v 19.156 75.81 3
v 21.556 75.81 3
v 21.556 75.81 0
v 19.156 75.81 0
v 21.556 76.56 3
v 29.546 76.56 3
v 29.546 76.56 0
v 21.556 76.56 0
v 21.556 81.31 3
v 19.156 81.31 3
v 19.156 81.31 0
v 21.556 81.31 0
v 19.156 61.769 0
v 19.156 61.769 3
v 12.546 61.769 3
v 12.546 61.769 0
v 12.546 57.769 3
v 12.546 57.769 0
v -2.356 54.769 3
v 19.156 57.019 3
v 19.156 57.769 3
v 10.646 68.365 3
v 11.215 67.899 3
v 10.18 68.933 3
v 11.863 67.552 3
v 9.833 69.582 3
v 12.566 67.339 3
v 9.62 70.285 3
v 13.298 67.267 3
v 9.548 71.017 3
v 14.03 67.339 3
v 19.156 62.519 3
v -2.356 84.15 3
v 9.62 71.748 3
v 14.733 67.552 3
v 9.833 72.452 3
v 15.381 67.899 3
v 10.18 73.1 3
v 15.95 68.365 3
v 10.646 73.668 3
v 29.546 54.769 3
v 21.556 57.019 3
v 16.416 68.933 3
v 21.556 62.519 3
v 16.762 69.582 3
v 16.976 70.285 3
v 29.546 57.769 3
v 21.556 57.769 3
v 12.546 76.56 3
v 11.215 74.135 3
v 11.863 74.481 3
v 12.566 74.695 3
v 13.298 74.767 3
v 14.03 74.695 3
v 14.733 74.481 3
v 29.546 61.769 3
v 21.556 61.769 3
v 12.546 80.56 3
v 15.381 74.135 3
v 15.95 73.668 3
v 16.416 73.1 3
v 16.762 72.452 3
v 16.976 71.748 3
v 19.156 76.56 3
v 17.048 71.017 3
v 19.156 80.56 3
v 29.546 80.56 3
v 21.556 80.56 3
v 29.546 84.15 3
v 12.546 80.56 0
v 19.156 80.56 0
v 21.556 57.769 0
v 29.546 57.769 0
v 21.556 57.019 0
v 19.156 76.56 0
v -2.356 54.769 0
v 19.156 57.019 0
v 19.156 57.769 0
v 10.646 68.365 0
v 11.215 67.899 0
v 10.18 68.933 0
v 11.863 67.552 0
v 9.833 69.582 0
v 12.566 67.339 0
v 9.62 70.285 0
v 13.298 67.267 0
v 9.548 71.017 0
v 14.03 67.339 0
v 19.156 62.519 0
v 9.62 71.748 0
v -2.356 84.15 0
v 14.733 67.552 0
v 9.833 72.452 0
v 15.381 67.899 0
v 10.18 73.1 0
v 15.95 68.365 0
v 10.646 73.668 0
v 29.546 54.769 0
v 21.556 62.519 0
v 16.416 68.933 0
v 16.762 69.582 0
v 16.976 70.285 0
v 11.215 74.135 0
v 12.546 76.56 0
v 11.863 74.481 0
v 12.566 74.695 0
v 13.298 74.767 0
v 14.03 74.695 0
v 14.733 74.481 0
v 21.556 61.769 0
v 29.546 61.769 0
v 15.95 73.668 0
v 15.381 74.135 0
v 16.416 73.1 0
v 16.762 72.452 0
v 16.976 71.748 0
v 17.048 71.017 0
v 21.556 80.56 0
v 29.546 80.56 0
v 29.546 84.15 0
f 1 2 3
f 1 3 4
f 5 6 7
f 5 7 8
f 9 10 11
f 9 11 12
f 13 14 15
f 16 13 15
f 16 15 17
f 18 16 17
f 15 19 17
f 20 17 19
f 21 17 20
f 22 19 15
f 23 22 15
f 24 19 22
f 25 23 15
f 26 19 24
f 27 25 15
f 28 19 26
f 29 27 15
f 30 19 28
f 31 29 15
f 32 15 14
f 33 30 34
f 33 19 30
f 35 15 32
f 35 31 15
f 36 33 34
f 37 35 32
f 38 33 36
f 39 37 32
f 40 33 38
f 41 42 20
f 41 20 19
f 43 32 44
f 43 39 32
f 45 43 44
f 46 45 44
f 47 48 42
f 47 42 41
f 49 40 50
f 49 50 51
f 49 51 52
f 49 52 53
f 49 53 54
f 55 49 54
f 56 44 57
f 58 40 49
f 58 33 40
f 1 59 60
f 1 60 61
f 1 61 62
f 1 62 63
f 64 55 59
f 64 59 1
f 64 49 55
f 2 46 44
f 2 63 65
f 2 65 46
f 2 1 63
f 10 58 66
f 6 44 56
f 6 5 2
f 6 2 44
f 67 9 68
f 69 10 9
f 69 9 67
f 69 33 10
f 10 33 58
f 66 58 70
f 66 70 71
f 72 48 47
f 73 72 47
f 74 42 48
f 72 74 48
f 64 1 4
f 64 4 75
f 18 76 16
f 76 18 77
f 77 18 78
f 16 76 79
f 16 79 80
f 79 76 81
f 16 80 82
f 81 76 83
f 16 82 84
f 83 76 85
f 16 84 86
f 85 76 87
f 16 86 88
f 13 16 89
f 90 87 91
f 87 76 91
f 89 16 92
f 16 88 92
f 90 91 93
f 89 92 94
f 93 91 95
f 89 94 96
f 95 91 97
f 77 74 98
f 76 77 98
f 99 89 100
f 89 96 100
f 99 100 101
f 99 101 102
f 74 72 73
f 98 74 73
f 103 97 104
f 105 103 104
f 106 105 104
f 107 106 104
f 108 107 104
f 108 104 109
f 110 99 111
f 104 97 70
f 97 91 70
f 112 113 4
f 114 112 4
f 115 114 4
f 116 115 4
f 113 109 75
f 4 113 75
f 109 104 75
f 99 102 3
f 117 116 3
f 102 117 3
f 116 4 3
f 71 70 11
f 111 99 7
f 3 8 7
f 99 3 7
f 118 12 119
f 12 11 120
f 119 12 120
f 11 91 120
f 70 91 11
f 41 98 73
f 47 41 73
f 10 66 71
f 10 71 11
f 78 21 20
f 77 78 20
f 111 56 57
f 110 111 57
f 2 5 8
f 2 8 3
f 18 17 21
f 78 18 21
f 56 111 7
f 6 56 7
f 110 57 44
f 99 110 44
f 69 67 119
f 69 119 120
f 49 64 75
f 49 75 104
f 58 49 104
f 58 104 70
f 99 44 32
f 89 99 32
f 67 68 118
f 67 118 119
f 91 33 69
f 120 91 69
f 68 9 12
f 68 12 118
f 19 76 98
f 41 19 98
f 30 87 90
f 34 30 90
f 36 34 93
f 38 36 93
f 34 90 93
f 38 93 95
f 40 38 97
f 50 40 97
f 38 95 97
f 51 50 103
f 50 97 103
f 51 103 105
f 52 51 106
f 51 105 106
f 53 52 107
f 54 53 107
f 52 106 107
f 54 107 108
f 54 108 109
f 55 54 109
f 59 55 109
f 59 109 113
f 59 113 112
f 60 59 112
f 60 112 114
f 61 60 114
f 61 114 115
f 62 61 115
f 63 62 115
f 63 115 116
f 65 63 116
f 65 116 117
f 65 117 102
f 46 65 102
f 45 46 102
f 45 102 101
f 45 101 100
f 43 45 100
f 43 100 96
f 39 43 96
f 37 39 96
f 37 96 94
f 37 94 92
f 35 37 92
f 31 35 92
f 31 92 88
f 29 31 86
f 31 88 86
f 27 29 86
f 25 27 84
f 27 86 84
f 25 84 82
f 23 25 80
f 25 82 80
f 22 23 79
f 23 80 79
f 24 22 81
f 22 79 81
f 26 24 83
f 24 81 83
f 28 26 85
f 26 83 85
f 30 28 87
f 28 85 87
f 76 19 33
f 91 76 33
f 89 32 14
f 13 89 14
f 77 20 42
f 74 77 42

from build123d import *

# Parameters (mm, degrees)
SKETCH1_W           = 31.901767955
SKETCH1_H           = 28.791004307
BOSS_EXTRUDE2_DEPTH = 3
SKETCH3_R           = 3.75
CUT_EXTRUDE1_DEPTH  = 33
CUT_EXTRUDE2_DEPTH  = 33
SKETCH6_W           = 31.901767955
SKETCH6_H           = 0.59
BOSS_EXTRUDE3_DEPTH = 3


with BuildPart() as part:
    # Sketch1 → Boss-Extrude2 (new body)
    with BuildSketch(Plane.XY):
        with Locations((13.594756215, 69.164541294)):
            Rectangle(SKETCH1_W, SKETCH1_H)
    extrude(amount=BOSS_EXTRUDE2_DEPTH)

    # Sketch3 → Cut-Extrude1 (cut)
    with BuildSketch(Plane(origin=(0, 0, 0), x_dir=(-1, 0, 0), z_dir=(0, 0, -1))):
        with Locations((-13.297916625, 71.016762707)):
            Circle(SKETCH3_R)
    extrude(amount=-CUT_EXTRUDE1_DEPTH, mode=Mode.SUBTRACT)

    # Sketch5 → Cut-Extrude2 (cut)
    with BuildSketch(Plane.XY.offset(3)):
        Polygon((29.545640192, 76.560043447), (21.555740858, 76.560043447), (21.555740858, 75.810043447), (19.155740858, 75.810043447), (19.155740858, 76.560043447), (12.545640192, 76.560043447), (12.545640192, 80.560043447), (19.155740858, 80.560043447), (19.155740858, 81.310043447), (21.555740858, 81.310043447), (21.555740858, 80.560043447), (29.545640192, 80.560043447), align=None)
        Polygon((29.545640192, 57.76903914), (29.545640192, 61.76903914), (21.555740858, 61.76903914), (21.555740858, 62.51903914), (19.155740858, 62.51903914), (19.155740858, 61.76903914), (12.545640192, 61.76903914), (12.545640192, 57.76903914), (19.155740858, 57.76903914), (19.155740858, 57.01903914), (21.555740858, 57.01903914), (21.555740858, 57.76903914), align=None)
    extrude(amount=-CUT_EXTRUDE2_DEPTH, mode=Mode.SUBTRACT)

    # Sketch6 → Boss-Extrude3 (add)
    with BuildSketch(Plane.XY.offset(3)):
        with Locations((13.594756215, 83.855043447)):
            Rectangle(SKETCH6_W, SKETCH6_H)
    extrude(amount=-BOSS_EXTRUDE3_DEPTH)


solid = part.part
